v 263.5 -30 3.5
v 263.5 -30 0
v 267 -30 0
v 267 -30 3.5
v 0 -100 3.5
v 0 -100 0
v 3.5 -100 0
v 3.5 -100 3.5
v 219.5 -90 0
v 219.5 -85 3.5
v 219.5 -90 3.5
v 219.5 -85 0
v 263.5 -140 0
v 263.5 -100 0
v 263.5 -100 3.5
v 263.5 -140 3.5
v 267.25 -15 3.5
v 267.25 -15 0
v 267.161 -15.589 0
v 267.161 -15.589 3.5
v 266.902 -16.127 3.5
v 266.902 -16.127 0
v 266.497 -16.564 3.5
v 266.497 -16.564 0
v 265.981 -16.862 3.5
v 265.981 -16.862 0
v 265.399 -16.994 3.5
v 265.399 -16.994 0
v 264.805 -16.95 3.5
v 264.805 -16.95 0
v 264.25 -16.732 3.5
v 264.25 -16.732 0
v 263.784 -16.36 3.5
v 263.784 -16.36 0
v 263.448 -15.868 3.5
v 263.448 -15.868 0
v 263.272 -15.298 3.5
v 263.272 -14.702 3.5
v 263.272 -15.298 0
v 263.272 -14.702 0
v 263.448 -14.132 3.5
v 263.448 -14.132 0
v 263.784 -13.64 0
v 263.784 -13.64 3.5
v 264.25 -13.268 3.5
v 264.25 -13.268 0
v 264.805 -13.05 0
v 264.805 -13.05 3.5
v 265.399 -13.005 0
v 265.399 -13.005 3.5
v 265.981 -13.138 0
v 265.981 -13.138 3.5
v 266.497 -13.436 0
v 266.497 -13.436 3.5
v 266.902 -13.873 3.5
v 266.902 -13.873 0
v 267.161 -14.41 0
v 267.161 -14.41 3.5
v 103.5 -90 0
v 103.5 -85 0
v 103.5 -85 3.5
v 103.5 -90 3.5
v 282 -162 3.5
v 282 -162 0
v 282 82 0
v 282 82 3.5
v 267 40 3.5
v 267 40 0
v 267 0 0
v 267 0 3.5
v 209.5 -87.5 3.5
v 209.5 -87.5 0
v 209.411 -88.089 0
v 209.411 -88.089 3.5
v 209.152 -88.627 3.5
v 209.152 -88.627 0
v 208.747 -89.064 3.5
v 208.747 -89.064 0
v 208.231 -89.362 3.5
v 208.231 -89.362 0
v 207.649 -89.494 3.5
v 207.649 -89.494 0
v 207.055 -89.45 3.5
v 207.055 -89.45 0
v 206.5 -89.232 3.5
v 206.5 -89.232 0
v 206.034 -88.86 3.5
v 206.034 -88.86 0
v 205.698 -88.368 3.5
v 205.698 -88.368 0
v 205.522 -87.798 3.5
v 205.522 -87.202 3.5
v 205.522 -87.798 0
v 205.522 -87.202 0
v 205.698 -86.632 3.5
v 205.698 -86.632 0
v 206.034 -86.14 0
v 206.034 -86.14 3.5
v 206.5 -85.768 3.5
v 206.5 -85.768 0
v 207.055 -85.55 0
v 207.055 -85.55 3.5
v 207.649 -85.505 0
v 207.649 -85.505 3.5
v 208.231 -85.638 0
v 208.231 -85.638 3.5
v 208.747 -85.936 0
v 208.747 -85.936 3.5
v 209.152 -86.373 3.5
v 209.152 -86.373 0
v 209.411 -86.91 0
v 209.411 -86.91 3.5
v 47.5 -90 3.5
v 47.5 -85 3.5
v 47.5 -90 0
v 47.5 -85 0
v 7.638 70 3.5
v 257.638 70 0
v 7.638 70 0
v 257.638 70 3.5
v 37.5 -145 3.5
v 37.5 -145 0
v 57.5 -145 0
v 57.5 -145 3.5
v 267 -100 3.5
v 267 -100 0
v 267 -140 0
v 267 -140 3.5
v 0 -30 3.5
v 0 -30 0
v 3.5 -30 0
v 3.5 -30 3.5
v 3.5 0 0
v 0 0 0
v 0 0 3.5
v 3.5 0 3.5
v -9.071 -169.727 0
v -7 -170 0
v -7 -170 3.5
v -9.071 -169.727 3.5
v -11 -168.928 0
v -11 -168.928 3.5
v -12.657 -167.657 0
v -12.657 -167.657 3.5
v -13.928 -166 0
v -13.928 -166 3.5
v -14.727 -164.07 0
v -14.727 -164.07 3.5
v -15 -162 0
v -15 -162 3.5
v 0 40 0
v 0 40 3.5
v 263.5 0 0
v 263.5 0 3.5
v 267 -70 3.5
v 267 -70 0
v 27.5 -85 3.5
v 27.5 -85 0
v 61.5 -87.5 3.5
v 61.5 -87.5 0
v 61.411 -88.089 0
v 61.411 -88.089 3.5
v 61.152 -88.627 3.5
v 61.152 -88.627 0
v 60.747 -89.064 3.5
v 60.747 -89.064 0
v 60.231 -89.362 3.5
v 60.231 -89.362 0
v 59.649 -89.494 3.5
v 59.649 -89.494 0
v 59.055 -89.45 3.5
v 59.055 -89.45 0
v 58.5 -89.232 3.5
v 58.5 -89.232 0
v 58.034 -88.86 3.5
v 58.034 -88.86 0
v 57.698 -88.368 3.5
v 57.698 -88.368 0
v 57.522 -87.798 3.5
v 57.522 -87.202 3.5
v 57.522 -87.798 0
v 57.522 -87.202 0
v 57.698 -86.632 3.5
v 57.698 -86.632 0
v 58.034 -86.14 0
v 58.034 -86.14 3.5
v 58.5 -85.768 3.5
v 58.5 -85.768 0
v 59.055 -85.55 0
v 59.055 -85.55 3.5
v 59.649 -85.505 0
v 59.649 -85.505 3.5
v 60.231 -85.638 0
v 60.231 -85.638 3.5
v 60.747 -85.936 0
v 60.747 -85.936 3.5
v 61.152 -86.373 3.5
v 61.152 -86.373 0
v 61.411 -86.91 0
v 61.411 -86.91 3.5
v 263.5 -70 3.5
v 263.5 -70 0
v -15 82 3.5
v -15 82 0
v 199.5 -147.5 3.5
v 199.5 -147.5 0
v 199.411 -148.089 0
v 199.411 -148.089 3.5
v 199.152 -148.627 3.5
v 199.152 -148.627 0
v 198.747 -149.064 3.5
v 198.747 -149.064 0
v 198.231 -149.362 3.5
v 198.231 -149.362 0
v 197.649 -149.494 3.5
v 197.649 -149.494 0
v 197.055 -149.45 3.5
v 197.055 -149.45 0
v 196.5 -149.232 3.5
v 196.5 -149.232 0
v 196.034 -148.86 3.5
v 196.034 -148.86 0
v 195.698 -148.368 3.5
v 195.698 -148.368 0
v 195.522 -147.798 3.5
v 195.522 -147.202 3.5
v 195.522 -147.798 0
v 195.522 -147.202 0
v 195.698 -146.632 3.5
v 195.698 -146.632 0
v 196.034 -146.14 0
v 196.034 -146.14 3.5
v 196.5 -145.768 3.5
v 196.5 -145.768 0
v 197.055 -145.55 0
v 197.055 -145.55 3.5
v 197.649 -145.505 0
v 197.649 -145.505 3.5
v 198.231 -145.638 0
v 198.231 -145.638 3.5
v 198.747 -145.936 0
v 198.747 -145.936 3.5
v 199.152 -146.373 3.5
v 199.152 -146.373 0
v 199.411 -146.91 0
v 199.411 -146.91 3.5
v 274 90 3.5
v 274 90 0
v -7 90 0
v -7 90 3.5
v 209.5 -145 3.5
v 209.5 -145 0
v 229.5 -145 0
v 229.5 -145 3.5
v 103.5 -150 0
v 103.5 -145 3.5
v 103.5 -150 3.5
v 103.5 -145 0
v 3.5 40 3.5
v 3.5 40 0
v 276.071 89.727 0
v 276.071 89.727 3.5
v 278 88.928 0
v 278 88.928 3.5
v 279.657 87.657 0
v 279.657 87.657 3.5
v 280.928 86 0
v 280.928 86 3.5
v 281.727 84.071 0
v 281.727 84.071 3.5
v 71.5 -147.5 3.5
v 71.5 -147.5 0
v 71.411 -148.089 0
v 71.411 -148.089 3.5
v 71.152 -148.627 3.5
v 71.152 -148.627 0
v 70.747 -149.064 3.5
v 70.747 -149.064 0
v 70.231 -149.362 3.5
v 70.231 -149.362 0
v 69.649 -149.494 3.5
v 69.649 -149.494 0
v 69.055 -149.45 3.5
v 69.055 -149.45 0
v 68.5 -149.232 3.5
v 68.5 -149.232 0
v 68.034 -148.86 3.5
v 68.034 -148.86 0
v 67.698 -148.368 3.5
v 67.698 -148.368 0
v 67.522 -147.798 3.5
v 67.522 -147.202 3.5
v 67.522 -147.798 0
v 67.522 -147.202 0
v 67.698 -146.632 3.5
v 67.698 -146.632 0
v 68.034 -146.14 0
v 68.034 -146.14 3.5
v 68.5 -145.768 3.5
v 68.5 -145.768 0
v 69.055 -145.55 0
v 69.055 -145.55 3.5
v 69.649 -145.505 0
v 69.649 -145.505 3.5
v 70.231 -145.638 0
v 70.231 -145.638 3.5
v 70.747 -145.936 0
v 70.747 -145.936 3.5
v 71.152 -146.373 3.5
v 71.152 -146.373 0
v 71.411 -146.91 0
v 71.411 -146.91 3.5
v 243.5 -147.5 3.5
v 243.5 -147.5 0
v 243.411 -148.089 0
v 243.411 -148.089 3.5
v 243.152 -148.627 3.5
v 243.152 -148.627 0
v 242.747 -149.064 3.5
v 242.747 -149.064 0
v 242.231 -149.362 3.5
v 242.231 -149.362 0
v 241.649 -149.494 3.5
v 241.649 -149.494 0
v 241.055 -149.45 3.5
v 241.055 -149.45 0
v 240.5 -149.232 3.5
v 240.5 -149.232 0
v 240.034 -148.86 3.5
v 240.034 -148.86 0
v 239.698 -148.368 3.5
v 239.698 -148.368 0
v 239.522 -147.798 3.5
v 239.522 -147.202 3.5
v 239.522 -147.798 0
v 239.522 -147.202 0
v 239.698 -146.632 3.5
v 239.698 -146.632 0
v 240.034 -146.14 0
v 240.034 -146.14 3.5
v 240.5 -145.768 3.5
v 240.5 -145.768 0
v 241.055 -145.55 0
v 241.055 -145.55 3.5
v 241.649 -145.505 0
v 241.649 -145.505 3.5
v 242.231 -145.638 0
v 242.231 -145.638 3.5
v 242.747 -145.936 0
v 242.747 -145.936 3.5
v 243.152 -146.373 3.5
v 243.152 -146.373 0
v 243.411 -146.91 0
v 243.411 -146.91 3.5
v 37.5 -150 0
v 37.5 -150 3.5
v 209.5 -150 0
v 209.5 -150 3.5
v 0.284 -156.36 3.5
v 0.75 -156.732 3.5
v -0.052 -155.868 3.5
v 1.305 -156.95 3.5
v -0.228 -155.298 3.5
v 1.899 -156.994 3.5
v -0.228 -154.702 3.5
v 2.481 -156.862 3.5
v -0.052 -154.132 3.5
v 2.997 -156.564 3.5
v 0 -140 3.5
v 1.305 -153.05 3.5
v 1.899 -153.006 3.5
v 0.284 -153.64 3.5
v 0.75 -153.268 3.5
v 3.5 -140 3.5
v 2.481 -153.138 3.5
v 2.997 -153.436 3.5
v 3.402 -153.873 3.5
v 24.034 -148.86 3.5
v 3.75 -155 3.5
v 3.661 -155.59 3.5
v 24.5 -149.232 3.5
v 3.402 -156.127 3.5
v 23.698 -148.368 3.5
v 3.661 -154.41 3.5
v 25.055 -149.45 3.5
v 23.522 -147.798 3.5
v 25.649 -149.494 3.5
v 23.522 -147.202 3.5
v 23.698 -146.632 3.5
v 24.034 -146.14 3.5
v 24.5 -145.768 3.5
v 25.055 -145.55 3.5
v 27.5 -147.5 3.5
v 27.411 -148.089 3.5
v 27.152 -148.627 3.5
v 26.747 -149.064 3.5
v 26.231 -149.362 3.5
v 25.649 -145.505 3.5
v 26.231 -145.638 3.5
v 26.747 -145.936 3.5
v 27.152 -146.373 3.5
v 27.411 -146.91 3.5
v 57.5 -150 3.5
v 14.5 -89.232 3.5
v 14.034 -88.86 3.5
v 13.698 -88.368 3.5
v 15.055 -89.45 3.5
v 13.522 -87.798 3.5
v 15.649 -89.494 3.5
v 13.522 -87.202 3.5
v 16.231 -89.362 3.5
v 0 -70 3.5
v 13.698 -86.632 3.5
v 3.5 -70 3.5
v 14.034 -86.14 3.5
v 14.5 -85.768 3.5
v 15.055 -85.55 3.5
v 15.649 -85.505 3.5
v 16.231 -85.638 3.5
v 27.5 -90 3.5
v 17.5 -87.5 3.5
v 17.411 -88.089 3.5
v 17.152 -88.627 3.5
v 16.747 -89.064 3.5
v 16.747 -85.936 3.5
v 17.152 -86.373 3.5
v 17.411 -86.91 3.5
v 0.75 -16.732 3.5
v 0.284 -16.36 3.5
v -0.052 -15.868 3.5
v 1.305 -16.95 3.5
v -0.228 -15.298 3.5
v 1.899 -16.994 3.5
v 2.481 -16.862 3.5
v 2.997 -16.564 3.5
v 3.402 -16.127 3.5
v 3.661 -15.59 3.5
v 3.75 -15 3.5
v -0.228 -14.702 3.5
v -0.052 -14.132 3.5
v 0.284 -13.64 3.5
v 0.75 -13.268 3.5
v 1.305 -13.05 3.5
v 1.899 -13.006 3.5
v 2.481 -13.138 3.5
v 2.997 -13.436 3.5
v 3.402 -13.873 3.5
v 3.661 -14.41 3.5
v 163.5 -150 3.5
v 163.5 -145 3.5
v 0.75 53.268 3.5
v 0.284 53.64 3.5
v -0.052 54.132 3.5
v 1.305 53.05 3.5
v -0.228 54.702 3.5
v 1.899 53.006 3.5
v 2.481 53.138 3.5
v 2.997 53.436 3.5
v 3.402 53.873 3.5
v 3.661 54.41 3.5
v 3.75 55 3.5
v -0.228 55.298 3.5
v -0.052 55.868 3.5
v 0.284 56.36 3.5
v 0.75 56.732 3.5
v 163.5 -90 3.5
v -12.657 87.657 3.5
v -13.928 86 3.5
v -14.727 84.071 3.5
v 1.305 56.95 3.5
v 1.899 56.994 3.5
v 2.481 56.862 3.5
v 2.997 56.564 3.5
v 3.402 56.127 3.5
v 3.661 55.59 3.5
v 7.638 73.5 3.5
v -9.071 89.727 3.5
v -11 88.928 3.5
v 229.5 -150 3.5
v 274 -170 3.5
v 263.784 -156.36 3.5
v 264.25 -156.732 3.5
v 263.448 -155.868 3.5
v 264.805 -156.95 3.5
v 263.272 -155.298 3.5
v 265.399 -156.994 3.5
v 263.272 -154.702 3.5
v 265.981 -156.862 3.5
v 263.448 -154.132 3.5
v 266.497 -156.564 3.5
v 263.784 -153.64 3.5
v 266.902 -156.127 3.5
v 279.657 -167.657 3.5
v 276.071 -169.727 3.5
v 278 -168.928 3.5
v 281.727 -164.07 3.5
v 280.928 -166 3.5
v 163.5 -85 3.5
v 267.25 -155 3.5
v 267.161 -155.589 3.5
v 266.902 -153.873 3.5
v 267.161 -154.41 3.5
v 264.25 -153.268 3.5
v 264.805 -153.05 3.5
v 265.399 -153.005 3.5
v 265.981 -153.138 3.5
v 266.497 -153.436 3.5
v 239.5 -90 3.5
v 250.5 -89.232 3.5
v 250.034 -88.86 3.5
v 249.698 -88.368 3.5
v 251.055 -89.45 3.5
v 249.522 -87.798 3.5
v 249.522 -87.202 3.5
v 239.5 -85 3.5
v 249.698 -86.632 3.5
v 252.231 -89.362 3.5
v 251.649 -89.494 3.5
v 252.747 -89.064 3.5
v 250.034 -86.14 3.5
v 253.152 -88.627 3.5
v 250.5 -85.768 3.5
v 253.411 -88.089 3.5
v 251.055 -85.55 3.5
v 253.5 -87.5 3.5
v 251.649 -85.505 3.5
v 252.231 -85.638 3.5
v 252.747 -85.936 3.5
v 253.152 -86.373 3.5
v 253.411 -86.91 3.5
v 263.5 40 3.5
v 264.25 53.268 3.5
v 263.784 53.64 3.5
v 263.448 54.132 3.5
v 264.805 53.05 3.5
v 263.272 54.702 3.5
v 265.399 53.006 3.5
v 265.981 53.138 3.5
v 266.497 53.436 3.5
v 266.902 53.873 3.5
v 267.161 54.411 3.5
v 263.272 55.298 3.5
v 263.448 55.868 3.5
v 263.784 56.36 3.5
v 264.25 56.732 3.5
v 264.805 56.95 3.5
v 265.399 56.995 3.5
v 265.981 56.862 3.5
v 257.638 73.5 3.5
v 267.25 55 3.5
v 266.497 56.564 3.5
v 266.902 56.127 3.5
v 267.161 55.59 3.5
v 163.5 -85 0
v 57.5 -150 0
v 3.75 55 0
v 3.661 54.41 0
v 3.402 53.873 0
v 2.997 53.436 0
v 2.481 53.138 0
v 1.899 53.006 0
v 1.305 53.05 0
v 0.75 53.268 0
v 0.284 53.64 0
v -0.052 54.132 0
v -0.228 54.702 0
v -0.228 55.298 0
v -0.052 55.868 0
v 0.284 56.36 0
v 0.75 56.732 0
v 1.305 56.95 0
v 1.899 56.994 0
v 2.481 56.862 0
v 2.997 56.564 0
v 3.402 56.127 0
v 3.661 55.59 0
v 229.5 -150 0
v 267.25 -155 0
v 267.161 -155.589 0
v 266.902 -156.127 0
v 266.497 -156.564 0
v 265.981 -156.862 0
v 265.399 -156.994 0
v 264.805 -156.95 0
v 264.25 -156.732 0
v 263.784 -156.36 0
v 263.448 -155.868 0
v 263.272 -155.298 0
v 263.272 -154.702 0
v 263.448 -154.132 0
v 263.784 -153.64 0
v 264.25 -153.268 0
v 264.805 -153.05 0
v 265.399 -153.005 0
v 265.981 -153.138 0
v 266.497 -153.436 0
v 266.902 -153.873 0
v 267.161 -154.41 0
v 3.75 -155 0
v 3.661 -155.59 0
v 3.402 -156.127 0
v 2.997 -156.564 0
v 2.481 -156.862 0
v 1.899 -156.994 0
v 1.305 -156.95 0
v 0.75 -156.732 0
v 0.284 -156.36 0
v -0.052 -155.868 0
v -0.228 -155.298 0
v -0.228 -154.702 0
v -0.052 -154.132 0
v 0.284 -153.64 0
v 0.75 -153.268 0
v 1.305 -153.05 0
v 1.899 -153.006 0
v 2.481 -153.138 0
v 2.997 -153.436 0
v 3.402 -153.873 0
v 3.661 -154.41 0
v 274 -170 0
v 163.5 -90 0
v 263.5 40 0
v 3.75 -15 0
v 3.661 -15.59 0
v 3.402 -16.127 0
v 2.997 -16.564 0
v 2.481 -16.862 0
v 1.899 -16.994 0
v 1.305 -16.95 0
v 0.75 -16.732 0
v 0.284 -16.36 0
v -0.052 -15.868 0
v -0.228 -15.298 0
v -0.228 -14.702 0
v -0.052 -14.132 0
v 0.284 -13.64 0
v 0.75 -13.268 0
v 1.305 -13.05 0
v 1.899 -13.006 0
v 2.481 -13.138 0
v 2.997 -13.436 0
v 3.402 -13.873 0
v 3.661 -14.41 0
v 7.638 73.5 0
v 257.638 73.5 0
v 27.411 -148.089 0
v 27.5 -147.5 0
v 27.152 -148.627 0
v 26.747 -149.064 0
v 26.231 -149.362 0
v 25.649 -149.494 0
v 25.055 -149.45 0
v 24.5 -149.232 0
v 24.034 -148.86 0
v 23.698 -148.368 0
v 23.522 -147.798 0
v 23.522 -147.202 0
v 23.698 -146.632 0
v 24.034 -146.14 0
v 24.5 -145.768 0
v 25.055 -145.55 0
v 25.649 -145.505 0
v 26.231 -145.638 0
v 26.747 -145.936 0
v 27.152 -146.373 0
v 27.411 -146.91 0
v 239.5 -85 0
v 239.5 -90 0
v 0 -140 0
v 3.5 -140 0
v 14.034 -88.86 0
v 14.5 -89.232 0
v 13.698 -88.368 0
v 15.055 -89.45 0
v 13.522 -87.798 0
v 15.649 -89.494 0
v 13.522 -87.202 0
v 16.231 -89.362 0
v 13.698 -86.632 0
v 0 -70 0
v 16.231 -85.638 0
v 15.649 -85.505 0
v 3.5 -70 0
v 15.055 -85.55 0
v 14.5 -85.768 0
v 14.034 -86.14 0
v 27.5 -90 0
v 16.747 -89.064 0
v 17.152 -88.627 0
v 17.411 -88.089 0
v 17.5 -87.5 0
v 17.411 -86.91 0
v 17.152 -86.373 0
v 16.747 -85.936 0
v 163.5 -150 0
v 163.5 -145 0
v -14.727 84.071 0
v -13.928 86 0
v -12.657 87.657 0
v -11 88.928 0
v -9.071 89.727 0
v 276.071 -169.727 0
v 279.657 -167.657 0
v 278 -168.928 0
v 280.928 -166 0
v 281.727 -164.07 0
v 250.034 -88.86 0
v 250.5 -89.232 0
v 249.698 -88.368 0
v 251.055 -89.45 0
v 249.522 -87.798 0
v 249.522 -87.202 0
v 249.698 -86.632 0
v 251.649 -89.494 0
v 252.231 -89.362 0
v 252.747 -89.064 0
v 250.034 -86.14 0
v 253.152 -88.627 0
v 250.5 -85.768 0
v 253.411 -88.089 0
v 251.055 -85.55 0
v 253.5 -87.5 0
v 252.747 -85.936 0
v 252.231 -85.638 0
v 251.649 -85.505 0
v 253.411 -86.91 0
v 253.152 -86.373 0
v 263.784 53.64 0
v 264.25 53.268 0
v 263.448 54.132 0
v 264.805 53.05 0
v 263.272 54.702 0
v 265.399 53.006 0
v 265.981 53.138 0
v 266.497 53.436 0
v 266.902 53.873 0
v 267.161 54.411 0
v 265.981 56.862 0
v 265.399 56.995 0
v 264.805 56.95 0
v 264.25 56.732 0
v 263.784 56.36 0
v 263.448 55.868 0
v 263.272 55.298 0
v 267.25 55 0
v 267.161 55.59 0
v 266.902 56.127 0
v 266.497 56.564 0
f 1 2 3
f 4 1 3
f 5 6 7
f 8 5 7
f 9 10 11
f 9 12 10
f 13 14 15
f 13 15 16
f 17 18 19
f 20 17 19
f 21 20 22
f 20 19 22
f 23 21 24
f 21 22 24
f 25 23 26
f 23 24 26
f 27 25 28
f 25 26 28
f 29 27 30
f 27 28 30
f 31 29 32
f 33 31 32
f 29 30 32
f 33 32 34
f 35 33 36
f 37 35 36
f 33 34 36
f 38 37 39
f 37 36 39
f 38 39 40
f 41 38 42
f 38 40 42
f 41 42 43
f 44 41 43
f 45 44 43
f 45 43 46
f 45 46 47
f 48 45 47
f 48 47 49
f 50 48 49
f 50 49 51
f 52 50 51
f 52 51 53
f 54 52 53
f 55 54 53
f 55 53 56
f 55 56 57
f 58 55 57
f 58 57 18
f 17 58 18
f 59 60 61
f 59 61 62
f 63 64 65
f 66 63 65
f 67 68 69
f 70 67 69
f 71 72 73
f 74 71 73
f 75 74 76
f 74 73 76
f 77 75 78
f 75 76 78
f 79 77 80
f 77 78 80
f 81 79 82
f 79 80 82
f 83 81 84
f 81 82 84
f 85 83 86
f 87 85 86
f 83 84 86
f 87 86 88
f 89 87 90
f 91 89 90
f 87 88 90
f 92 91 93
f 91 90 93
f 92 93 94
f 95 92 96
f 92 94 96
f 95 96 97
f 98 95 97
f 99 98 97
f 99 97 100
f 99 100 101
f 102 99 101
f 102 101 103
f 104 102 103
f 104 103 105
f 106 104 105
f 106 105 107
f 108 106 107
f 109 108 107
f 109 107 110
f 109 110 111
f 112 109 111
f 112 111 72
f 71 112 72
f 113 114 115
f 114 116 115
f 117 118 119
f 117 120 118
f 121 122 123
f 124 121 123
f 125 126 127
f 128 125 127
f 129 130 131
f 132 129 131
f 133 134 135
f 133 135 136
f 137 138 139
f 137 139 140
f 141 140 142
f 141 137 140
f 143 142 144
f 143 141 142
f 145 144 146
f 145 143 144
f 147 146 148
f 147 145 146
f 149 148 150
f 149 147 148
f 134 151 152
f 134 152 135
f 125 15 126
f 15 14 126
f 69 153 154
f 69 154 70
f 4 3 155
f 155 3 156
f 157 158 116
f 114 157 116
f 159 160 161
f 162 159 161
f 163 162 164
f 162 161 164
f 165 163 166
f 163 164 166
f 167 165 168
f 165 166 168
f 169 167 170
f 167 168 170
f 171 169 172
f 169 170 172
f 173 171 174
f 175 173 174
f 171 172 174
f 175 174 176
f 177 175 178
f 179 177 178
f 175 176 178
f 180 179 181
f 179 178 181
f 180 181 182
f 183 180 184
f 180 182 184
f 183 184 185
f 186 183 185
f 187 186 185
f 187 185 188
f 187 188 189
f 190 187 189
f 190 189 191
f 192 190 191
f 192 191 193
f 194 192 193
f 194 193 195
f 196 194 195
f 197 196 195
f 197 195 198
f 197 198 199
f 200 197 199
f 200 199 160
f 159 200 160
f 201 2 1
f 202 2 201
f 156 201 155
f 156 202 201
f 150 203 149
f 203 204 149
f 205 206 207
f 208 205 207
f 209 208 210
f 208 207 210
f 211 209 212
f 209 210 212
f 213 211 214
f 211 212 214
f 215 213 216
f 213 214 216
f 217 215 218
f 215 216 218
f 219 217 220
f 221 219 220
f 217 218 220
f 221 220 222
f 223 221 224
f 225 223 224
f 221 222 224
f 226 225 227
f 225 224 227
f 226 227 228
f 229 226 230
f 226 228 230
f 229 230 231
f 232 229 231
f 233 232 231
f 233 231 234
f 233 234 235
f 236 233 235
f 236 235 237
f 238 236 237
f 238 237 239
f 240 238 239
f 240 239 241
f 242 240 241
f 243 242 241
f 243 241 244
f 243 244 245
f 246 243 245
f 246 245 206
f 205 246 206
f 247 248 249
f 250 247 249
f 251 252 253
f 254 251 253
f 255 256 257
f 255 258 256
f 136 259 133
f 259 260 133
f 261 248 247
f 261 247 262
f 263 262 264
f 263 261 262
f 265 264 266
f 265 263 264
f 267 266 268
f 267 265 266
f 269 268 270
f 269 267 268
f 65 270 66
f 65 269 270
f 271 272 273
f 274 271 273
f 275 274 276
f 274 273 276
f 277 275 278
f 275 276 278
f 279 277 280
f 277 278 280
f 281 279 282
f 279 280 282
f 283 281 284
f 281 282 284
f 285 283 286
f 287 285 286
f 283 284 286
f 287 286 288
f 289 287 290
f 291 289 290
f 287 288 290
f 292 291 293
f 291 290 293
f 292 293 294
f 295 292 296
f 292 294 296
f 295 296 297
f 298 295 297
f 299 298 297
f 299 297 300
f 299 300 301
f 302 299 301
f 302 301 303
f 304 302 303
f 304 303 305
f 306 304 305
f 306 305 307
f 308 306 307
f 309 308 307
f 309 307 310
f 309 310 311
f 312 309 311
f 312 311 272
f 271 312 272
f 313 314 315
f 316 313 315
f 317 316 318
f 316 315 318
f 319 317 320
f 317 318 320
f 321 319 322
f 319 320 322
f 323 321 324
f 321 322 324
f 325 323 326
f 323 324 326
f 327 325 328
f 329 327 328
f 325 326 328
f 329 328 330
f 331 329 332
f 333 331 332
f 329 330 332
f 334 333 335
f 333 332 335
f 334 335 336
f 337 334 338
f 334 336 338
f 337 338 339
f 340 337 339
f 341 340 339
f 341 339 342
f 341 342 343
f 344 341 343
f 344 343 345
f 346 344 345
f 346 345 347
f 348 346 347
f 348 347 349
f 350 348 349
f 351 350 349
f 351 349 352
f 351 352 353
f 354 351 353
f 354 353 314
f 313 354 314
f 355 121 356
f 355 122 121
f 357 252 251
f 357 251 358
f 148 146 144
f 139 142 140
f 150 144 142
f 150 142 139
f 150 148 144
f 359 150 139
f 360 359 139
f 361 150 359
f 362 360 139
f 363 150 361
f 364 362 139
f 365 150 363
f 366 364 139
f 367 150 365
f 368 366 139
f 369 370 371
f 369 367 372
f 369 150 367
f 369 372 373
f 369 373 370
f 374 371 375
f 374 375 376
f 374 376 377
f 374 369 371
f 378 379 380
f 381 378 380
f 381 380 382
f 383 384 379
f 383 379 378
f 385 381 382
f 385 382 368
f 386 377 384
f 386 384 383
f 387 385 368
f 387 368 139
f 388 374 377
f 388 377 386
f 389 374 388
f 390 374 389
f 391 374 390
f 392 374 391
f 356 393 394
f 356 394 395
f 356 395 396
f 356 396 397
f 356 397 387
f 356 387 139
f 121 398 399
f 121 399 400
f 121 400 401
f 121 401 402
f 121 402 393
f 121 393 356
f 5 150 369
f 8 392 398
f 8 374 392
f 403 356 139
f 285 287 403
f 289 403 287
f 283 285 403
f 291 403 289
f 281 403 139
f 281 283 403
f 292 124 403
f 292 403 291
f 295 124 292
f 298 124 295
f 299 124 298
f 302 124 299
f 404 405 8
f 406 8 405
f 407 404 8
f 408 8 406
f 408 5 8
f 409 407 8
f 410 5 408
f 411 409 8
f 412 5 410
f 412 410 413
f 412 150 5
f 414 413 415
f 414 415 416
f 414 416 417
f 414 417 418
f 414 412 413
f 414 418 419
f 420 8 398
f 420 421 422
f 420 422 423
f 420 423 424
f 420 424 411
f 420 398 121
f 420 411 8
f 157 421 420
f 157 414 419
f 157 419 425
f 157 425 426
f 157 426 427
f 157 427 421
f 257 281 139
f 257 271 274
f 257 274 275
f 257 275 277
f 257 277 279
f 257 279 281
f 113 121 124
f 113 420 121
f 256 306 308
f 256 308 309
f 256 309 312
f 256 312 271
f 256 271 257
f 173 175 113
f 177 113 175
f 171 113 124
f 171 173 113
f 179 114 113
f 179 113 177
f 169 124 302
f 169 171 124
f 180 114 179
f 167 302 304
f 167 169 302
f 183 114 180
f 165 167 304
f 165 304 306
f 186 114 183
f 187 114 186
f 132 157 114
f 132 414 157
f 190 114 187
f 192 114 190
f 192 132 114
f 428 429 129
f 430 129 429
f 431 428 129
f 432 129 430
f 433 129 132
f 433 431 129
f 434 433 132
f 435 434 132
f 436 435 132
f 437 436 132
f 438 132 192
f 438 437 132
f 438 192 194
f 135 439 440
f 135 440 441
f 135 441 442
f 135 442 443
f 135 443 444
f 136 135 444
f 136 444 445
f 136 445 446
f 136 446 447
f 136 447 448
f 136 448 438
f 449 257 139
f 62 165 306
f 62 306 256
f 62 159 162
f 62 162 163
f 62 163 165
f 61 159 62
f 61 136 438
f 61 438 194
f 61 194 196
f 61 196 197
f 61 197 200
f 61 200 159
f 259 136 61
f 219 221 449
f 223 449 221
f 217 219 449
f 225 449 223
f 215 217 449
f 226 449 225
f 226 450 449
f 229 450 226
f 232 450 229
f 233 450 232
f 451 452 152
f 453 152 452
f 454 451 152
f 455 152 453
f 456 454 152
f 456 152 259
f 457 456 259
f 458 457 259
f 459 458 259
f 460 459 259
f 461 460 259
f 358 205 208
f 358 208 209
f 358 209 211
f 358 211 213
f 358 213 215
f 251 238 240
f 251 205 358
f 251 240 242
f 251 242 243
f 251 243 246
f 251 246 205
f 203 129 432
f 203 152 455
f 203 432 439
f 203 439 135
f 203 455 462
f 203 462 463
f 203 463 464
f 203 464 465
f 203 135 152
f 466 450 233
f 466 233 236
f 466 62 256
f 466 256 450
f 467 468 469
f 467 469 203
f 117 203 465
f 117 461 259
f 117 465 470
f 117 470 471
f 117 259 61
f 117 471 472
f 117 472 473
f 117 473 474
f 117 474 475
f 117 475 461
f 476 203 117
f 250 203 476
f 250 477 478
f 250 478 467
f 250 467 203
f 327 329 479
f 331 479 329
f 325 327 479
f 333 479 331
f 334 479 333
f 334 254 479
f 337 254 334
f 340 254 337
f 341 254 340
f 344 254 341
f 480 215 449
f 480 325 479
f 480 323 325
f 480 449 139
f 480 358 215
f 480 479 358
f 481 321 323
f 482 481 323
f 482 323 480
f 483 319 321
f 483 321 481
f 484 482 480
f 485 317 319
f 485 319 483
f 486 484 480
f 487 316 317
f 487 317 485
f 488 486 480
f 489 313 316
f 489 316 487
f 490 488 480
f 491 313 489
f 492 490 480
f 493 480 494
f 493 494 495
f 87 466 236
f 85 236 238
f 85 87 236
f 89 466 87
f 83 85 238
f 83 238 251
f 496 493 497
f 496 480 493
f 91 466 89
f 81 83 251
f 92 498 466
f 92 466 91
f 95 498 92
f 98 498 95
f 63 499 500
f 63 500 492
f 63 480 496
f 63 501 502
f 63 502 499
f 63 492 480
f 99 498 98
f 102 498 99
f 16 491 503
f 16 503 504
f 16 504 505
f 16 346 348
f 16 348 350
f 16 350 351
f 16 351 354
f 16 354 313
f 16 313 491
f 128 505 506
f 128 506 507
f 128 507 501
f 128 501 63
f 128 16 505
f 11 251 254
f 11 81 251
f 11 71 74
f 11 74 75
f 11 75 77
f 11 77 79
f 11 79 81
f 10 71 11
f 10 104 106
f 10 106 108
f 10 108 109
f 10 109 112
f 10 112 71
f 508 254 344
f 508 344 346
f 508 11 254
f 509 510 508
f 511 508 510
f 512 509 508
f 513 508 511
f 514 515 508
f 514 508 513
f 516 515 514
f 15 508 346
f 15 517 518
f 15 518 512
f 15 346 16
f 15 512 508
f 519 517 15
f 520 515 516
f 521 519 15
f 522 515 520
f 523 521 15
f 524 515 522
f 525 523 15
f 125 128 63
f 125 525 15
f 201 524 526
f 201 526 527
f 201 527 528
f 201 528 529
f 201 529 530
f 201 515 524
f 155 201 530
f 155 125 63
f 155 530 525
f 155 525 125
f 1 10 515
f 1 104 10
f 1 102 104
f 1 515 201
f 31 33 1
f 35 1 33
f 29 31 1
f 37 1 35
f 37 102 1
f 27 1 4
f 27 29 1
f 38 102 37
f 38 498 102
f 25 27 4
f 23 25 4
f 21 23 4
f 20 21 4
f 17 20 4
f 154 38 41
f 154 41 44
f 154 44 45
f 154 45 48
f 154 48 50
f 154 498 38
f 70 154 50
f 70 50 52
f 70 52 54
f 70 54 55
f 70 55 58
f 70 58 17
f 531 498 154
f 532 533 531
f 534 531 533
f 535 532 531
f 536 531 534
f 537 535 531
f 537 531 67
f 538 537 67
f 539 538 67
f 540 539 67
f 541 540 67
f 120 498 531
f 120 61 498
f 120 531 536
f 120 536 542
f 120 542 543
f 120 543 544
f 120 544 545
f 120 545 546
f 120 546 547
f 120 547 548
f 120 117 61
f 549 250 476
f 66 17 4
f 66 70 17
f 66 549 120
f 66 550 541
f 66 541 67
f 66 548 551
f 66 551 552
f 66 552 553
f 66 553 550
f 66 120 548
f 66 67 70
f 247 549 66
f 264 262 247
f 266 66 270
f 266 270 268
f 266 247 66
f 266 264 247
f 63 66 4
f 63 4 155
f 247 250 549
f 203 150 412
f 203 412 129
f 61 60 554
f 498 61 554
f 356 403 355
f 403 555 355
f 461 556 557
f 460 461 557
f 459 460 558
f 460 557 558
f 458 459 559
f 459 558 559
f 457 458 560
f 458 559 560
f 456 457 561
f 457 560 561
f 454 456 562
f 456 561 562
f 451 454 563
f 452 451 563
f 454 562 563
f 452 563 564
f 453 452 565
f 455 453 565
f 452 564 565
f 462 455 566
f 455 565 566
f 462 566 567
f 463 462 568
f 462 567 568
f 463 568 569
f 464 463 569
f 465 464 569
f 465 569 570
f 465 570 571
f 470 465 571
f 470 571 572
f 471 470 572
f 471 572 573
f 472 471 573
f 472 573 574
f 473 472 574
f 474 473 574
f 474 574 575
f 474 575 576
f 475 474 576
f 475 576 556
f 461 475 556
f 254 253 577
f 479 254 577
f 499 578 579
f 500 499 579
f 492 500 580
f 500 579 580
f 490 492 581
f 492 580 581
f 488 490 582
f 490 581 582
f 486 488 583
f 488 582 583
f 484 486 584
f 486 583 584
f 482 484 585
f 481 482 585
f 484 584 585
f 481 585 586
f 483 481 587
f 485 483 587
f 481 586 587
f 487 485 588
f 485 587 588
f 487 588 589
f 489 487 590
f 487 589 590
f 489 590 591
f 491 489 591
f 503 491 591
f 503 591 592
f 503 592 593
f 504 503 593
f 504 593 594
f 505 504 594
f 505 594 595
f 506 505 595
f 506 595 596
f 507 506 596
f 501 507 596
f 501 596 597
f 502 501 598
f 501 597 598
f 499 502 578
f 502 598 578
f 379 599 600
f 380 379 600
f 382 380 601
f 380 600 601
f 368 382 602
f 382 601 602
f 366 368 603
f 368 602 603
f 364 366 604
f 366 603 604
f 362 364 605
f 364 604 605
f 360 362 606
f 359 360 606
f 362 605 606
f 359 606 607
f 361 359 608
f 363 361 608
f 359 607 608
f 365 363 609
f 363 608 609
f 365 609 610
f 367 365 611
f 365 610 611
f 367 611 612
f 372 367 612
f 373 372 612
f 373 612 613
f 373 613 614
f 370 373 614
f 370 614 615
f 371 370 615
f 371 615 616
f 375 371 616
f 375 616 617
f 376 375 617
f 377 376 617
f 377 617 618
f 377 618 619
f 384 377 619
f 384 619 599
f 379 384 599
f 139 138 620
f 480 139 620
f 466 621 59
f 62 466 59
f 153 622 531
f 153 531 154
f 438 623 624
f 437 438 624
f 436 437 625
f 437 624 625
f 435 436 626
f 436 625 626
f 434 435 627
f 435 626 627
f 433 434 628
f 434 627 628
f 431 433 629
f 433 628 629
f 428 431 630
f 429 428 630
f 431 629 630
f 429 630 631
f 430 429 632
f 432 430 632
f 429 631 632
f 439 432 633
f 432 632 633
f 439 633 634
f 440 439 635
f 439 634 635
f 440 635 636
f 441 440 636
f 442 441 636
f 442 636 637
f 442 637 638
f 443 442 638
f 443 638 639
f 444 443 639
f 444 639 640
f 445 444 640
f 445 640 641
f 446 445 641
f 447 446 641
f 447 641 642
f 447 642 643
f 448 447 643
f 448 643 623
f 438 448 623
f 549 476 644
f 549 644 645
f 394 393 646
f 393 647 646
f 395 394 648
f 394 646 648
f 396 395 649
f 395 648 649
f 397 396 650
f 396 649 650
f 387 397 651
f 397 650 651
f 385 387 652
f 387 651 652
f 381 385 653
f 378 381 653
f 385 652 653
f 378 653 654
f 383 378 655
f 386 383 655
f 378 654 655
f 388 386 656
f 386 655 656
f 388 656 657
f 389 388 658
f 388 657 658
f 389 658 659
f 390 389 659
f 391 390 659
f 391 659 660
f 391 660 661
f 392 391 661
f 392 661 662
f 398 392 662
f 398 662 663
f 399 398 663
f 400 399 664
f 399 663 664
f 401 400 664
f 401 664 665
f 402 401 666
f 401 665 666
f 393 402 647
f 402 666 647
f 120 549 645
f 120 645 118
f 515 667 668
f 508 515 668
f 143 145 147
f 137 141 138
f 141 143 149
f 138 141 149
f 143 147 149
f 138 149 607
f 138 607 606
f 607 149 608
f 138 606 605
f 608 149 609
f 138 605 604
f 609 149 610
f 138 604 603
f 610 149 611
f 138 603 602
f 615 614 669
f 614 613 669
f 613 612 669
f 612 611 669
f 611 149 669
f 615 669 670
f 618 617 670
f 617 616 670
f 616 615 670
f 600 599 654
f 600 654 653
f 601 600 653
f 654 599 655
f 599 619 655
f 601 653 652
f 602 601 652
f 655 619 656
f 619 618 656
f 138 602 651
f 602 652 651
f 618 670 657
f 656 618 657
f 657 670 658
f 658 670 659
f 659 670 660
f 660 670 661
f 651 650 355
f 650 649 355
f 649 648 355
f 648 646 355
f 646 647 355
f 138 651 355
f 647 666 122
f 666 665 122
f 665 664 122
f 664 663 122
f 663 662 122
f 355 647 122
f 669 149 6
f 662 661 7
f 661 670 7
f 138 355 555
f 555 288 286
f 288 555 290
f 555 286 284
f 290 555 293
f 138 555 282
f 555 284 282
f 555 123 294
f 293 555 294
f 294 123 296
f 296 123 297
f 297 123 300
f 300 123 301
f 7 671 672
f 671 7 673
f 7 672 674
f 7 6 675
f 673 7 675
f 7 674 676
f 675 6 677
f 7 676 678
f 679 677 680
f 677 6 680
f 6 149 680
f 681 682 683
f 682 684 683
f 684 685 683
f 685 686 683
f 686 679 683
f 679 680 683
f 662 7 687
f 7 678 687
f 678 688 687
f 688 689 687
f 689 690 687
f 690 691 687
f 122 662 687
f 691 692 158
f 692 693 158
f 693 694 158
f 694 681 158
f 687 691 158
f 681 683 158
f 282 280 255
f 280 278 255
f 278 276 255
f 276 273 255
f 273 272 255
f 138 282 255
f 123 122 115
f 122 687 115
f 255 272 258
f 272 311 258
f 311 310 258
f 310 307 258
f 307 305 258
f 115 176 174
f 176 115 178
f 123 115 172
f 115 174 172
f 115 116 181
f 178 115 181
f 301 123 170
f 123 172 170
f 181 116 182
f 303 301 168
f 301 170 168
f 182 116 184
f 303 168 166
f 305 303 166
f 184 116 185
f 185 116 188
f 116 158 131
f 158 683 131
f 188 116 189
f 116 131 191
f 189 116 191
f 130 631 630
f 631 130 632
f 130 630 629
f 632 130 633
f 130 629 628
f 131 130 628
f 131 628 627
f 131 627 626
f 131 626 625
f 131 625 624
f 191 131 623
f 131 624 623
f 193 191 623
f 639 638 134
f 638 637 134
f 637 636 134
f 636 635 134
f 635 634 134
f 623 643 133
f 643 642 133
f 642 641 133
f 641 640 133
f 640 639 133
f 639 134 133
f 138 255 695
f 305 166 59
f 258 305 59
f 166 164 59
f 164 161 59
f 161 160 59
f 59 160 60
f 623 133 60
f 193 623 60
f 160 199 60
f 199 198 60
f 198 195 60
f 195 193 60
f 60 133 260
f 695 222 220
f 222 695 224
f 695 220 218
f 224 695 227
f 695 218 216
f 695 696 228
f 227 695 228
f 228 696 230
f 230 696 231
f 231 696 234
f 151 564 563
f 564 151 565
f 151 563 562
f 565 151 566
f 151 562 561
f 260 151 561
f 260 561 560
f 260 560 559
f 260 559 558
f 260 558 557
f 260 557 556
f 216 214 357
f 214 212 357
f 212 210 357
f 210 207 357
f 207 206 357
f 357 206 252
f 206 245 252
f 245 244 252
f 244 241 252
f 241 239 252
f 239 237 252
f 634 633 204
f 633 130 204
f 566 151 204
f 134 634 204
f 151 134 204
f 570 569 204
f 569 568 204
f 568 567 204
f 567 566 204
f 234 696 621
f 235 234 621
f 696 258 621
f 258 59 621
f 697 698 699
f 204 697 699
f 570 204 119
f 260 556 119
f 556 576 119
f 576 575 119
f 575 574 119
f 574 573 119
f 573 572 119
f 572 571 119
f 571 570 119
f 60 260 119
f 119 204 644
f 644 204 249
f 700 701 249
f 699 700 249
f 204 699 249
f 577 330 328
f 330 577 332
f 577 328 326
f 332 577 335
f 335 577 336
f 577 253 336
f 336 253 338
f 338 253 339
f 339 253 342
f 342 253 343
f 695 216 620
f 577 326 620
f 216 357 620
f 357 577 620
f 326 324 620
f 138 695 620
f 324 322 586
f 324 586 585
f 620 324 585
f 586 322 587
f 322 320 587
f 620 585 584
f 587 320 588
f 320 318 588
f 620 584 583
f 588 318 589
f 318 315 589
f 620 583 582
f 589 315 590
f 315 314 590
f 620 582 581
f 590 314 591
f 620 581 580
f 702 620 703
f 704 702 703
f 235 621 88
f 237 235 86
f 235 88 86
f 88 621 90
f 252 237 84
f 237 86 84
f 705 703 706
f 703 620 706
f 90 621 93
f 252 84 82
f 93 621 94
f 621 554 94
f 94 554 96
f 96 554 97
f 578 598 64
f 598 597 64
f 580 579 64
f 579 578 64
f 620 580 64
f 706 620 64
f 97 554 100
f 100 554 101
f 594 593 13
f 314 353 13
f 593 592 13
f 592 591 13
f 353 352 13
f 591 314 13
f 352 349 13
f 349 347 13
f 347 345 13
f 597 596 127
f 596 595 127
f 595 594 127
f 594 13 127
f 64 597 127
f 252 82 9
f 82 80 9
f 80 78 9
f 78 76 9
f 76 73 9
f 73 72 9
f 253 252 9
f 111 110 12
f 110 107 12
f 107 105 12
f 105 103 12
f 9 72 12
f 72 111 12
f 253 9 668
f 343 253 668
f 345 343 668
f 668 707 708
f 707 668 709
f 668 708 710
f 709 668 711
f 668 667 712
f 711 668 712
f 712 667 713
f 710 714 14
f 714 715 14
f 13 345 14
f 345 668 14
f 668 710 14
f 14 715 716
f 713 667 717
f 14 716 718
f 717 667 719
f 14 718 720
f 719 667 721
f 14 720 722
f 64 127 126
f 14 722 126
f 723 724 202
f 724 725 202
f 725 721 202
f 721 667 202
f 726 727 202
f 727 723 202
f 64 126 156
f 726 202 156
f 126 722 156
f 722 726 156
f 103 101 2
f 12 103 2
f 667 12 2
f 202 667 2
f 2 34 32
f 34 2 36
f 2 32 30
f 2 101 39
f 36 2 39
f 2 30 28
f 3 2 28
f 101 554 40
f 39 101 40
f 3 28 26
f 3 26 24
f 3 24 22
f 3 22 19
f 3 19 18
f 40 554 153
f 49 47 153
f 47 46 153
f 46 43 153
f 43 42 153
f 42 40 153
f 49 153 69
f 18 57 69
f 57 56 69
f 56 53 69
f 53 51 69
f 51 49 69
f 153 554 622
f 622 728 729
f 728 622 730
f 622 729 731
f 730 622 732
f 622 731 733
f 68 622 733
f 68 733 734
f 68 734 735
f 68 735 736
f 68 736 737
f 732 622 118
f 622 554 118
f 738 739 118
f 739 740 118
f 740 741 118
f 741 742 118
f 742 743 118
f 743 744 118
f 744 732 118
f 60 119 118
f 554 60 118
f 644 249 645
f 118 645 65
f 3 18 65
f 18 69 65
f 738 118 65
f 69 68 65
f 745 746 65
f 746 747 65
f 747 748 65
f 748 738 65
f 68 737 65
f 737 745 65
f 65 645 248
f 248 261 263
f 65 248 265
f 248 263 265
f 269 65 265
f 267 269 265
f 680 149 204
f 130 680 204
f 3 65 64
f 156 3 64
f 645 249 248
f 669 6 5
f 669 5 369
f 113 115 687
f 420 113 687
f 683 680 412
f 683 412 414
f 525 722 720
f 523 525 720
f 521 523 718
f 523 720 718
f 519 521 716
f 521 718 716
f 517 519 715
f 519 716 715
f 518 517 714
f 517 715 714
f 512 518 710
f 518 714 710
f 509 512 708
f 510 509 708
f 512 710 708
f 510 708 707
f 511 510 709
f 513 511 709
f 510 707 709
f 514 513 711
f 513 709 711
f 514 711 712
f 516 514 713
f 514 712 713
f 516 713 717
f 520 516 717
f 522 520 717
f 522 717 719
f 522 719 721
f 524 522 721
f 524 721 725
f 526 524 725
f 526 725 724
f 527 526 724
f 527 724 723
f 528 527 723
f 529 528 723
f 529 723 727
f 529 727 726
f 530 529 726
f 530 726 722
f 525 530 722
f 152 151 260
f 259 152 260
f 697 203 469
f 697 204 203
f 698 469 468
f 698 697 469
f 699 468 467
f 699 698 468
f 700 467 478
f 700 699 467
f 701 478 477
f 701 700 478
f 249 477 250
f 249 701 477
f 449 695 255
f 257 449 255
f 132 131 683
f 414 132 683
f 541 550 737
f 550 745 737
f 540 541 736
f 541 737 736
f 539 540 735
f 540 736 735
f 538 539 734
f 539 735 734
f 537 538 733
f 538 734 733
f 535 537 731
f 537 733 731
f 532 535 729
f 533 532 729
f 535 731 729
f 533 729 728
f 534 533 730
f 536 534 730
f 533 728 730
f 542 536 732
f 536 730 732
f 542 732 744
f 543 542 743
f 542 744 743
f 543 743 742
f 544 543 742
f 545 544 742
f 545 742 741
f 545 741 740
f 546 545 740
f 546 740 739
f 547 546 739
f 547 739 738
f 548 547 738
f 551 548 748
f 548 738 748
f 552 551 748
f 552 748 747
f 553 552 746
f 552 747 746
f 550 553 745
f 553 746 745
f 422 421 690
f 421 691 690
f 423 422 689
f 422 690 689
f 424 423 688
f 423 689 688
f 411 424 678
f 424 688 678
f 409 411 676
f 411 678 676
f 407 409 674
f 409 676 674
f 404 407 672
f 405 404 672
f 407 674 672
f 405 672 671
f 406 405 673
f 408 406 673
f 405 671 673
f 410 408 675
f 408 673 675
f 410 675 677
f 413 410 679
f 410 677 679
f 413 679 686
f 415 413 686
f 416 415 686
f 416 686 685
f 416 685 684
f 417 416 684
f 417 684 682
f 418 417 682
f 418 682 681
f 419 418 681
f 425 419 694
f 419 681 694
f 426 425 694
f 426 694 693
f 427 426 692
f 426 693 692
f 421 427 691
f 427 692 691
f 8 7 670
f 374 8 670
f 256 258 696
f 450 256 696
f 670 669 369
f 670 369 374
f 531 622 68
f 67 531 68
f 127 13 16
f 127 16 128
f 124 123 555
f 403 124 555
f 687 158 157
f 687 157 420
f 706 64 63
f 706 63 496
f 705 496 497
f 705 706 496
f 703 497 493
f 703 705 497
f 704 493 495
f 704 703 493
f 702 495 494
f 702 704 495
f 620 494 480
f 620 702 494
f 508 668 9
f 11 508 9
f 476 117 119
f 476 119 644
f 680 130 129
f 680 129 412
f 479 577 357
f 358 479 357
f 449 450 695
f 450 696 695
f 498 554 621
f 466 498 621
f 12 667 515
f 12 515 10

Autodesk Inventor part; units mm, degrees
ref_plane "YZ Plane" through (0, 0, 0) normal (1, 0, 0) x (0, 1, 0)
ref_plane "XZ Plane" through (0, 0, 0) normal (0, 1, 0) x (-1, 0, 0)
ref_plane "XY Plane" through (0, 0, 0) normal (0, 0, 1) x (1, 0, 0)
sketch "Sketch1" plane through (0, 0, 0) normal (0, 0, 1) x (1, 0, 0)
  line L0 (0, 40) -> (0, 0)
  line L1 (0, 40) -> (3.5, 40)
  line L2 (3.5, 40) -> (3.5, 0)
  line L3 (0, 0) -> (3.5, 0)
  line L4 (0, 57) -> (3.5, 57)
  line L5 (3.5, 53) -> (0, 53)
  line L6 (0, -13) -> (3.5, -13)
  line L7 (3.5, -17) -> (0, -17)
  line L8 (0, -30) -> (0, -70)
  line L9 (0, -30) -> (3.5, -30)
  line L10 (3.5, -30) -> (3.5, -70)
  line L11 (0, -70) -> (3.5, -70)
  line L12 (0, -100) -> (0, -140)
  line L13 (3.5, -100) -> (3.5, -140)
  line L14 (0, -100) -> (3.5, -100)
  line L15 (0, -140) -> (3.5, -140)
  line L16 (0, -153) -> (3.5, -153)
  line L17 (3.5, -157) -> (0, -157)
  line L18 (263.5, 57.0001) -> (267, 57.0001)
  line L19 (267, 53.0001) -> (263.5, 53.0001)
  line L20 (263.5, 40.0001) -> (267, 40.0001)
  line L21 (263.5, 40.0001) -> (263.5, 0.0001)
  line L22 (267, 40.0001) -> (267, 0.0001)
  line L23 (263.5, 0.0001) -> (267, 0.0001)
  line L24 (263.5, -12.9999) -> (267, -12.9999)
  line L25 (267, -16.9999) -> (263.5, -16.9999)
  line L26 (263.5, -29.9999) -> (267, -29.9999)
  line L27 (263.5, -29.9999) -> (263.5, -69.9999)
  line L28 (267, -29.9999) -> (267, -69.9999)
  line L29 (263.5, -69.9999) -> (267, -69.9999)
  line L30 (263.5, -99.9999) -> (263.5, -139.9999)
  line L31 (263.5, -99.9999) -> (267, -99.9999)
  line L32 (267, -99.9999) -> (267, -139.9999)
  line L33 (263.5, -139.9999) -> (267, -139.9999)
  line L34 (263.5, -152.9999) -> (267, -152.9999)
  line L35 (267, -156.9999) -> (263.5, -156.9999)
  line L36 (23.5, -149.9999) -> (23.5, -144.9999)
  line L37 (27.5, -144.9999) -> (27.5, -149.9999)
  line L38 (37.5, -144.9999) -> (37.5, -149.9999)
  line L39 (57.5, -144.9999) -> (57.5, -149.9999)
  line L40 (67.5, -149.9999) -> (67.5, -144.9999)
  line L41 (71.5, -144.9999) -> (71.5, -149.9999)
  line L42 (37.5, -144.9999) -> (57.5, -144.9999)
  line L43 (57.5, -149.9999) -> (37.5, -149.9999)
  line L44 (103.5, -144.9999) -> (103.5, -149.9999)
  line L45 (103.5, -144.9999) -> (163.5, -144.9999)
  line L46 (163.5, -149.9999) -> (103.5, -149.9999)
  line L47 (163.5, -144.9999) -> (163.5, -149.9999)
  line L48 (195.5, -149.9999) -> (195.5, -144.9999)
  line L49 (199.5, -144.9999) -> (199.5, -149.9999)
  line L50 (209.5, -144.9999) -> (209.5, -149.9999)
  line L51 (229.5, -144.9999) -> (229.5, -149.9999)
  line L52 (209.5, -144.9999) -> (229.5, -144.9999)
  line L53 (229.5, -149.9999) -> (209.5, -149.9999)
  line L54 (239.5, -149.9999) -> (239.5, -144.9999)
  line L55 (243.5, -144.9999) -> (243.5, -149.9999)
  line L56 (253.5, -84.9999) -> (253.5, -89.9999)
  line L57 (249.5, -89.9999) -> (249.5, -84.9999)
  line L58 (239.5, -84.9999) -> (239.5, -89.9999)
  line L59 (239.5, -84.9999) -> (219.5, -84.9999)
  line L60 (219.5, -84.9999) -> (219.5, -89.9999)
  line L61 (239.5, -89.9999) -> (219.5, -89.9999)
  line L62 (205.5, -89.9999) -> (205.5, -84.9999)
  line L63 (209.5, -84.9999) -> (209.5, -89.9999)
  line L64 (103.5, -84.9999) -> (163.5, -84.9999)
  line L65 (163.5, -89.9999) -> (103.5, -89.9999)
  line L66 (163.5, -84.9999) -> (163.5, -89.9999)
  line L67 (103.5, -84.9999) -> (103.5, -89.9999)
  line L68 (57.5, -89.9999) -> (57.5, -84.9999)
  line L69 (61.5, -84.9999) -> (61.5, -89.9999)
  line L70 (47.5, -84.9999) -> (47.5, -89.9999)
  line L71 (27.5, -84.9999) -> (47.5, -84.9999)
  line L72 (47.5, -89.9999) -> (27.5, -89.9999)
  line L73 (27.5, -84.9999) -> (27.5, -89.9999)
  line L74 (13.5, -89.9999) -> (13.5, -84.9999)
  line L75 (17.5, -84.9999) -> (17.5, -89.9999)
  line L76 (-15, 82) -> (-15, -161.9999)
  arc A0 (-7, 90) -> (-15, 82) centre (-7, 82) ccw
  line L77 (274, 90) -> (-7, 90)
  arc A1 (282, 82) -> (274, 90) centre (274, 82) ccw
  line L78 (282, -161.9999) -> (282, 82)
  arc A2 (-15, -161.9999) -> (-7, -169.9999) centre (-7, -161.9999) ccw
  line L79 (-7, -169.9999) -> (274, -169.9999)
  arc A3 (274, -169.9999) -> (282, -161.9999) centre (274, -161.9999) ccw
  line L80 (1.75, 57) -> (1.75, 53)
  line L81 (1.75, -13) -> (1.75, -17)
  line L82 (1.75, -153) -> (1.75, -157)
  line L83 (23.5, -147.4999) -> (27.5, -147.4999)
  line L84 (67.5, -147.4999) -> (71.5, -147.4999)
  line L85 (195.5, -147.4999) -> (199.5, -147.4999)
  line L86 (239.5, -147.4999) -> (243.5, -147.4999)
  line L87 (265.25, -156.9999) -> (265.25, -152.9999)
  line L88 (13.5, -87.4999) -> (17.5, -87.4999)
  line L89 (57.5, -87.4999) -> (61.5, -87.4999)
  line L90 (205.5, -87.4999) -> (209.5, -87.4999)
  line L91 (249.5, -87.4999) -> (253.5, -87.4999)
  line L92 (265.25, -16.9999) -> (265.25, -12.9999)
  line L93 (265.25, 53.0001) -> (265.25, 57.0001)
  circle A4 centre (1.75, 55) radius 2
  circle A5 centre (1.75, -15) radius 2
  circle A6 centre (1.75, -155) radius 2
  circle A7 centre (25.5, -147.4999) radius 2
  circle A8 centre (69.5, -147.4999) radius 2
  circle A9 centre (197.5, -147.4999) radius 2
  circle A10 centre (241.5, -147.4999) radius 2
  circle A11 centre (265.25, -154.9999) radius 2
  circle A12 centre (15.5, -87.4999) radius 2
  circle A13 centre (59.5, -87.4999) radius 2
  circle A14 centre (207.5, -87.4999) radius 2
  circle A15 centre (251.5, -87.4999) radius 2
  circle A16 centre (265.25, -14.9999) radius 2
  circle A17 centre (265.25, 55.0001) radius 2
extrude "Extrusion1" add sketch "Sketch1" along normal blind 3.5
sketch "Sketch2" plane through (0, 0, 3.5) normal (0, 0, 1) x (1, 0, 0)
  line L0 (163.5, -84.9999) -> (163.5, -89.9999) construction
  line L1 (163.5, -89.9999) -> (103.5, -89.9999) construction
  line L2 (103.5, -89.9999) -> (103.5, -84.9999) construction
  line L3 (103.5, -84.9999) -> (163.5, -84.9999) construction
  line L4 (103.5, -144.9999) -> (163.5, -144.9999) construction
  line L5 (163.5, -144.9999) -> (163.5, -149.9999) construction
  line L6 (163.5, -149.9999) -> (103.5, -149.9999) construction
  line L7 (103.5, -149.9999) -> (103.5, -144.9999) construction
  line L8 (263.5, -99.9999) -> (267, -99.9999) construction
  line L9 (267, -99.9999) -> (267, -139.9999) construction
  line L10 (267, -139.9999) -> (263.5, -139.9999) construction
  line L11 (263.5, -139.9999) -> (263.5, -99.9999) construction
  line L12 (267, -29.9999) -> (267, -69.9999) construction
  line L13 (267, -69.9999) -> (263.5, -69.9999) construction
  line L14 (263.5, -69.9999) -> (263.5, -29.9999) construction
  line L15 (263.5, -29.9999) -> (267, -29.9999) construction
  line L16 (267, 40.0001) -> (267, 0.0001) construction
  line L17 (267, 0.0001) -> (263.5, 0.0001) construction
  line L18 (263.5, 0.0001) -> (263.5, 40.0001) construction
  line L19 (263.5, 40.0001) -> (267, 40.0001) construction
  line L20 (0, -100) -> (3.5, -100) construction
  line L21 (3.5, -100) -> (3.5, -140) construction
  line L22 (3.5, -140) -> (0, -140) construction
  line L23 (0, -140) -> (0, -100) construction
  line L24 (0, -30) -> (3.5, -30) construction
  line L25 (3.5, -30) -> (3.5, -70) construction
  line L26 (3.5, -70) -> (0, -70) construction
  line L27 (0, -70) -> (0, -30) construction
  line L28 (0, 40) -> (3.5, 40) construction
  line L29 (3.5, 40) -> (3.5, 0) construction
  line L30 (3.5, 0) -> (0, 0) construction
  line L31 (0, 0) -> (0, 40) construction
  line L32 (47.5, -89.9999) -> (27.5, -89.9999) construction
  line L33 (27.5, -89.9999) -> (27.5, -84.9999) construction
  line L34 (27.5, -84.9999) -> (47.5, -84.9999) construction
  line L35 (47.5, -84.9999) -> (47.5, -89.9999) construction
  line L36 (239.5, -89.9999) -> (219.5, -89.9999) construction
  line L37 (219.5, -89.9999) -> (219.5, -84.9999) construction
  line L38 (219.5, -84.9999) -> (239.5, -84.9999) construction
  line L39 (239.5, -84.9999) -> (239.5, -89.9999) construction
  line L40 (209.5, -144.9999) -> (229.5, -144.9999) construction
  line L41 (229.5, -144.9999) -> (229.5, -149.9999) construction
  line L42 (229.5, -149.9999) -> (209.5, -149.9999) construction
  line L43 (209.5, -149.9999) -> (209.5, -144.9999) construction
  line L44 (37.5, -144.9999) -> (57.5, -144.9999) construction
  line L45 (57.5, -144.9999) -> (57.5, -149.9999) construction
  line L46 (57.5, -149.9999) -> (37.5, -149.9999) construction
  line L47 (37.5, -149.9999) -> (37.5, -144.9999) construction
  circle A0 centre (265.25, 55.0001) radius 2 construction
  circle A1 centre (265.25, -14.9999) radius 2 construction
  circle A2 centre (251.5, -87.4999) radius 2 construction
  circle A3 centre (207.5, -87.4999) radius 2 construction
  circle A4 centre (59.5, -87.4999) radius 2 construction
  circle A5 centre (15.5, -87.4999) radius 2 construction
  circle A6 centre (265.25, -154.9999) radius 2 construction
  circle A7 centre (241.5, -147.4999) radius 2 construction
  circle A8 centre (197.5, -147.4999) radius 2 construction
  circle A9 centre (69.5, -147.4999) radius 2 construction
  circle A10 centre (25.5, -147.4999) radius 2 construction
  circle A11 centre (1.75, -155) radius 2 construction
  circle A12 centre (1.75, -15) radius 2 construction
  circle A13 centre (1.75, 55) radius 2 construction
  line L48 (-15, 82) -> (-15, -161.9999) construction
  arc A14 (-15, -161.9999) -> (-7, -169.9999) centre (-7, -161.9999) ccw construction
  line L49 (-7, -169.9999) -> (274, -169.9999) construction
  arc A15 (274, -169.9999) -> (282, -161.9999) centre (274, -161.9999) ccw construction
  line L50 (282, -161.9999) -> (282, 82) construction
  arc A16 (282, 82) -> (274, 90) centre (274, 82) ccw construction
  line L51 (274, 90) -> (-7, 90) construction
  arc A17 (-7, 90) -> (-15, 82) centre (-7, 82) ccw construction
  line L52 (-15, 82) -> (-15, 90) construction
  line L53 (-15, 90) -> (-7, 90) construction
  line L54 (-15.8616, 90) -> (7.6384, 90) construction
  line L55 (7.6384, 90) -> (7.6384, 73.5) construction
  line L56 (7.6384, 73.5) -> (-15.8616, 73.5) construction
  line L57 (-15.8616, 73.5) -> (-15.8616, 90) construction
  line L58 (7.6384, 73.5) -> (257.6384, 73.5)
  line L59 (257.6384, 73.5) -> (257.6384, 70)
  line L60 (257.6384, 70) -> (7.6384, 70)
  line L61 (7.6384, 70) -> (7.6384, 73.5)
  dimension "d2" = 23.5
  dimension "d3" = 16.5
  dimension "d4" = 250
  dimension "d5" = 3.5
extrude "Extrusion2" cut sketch "Sketch2" against normal blind 3.5
properties part number "Tapa_Trasera"
